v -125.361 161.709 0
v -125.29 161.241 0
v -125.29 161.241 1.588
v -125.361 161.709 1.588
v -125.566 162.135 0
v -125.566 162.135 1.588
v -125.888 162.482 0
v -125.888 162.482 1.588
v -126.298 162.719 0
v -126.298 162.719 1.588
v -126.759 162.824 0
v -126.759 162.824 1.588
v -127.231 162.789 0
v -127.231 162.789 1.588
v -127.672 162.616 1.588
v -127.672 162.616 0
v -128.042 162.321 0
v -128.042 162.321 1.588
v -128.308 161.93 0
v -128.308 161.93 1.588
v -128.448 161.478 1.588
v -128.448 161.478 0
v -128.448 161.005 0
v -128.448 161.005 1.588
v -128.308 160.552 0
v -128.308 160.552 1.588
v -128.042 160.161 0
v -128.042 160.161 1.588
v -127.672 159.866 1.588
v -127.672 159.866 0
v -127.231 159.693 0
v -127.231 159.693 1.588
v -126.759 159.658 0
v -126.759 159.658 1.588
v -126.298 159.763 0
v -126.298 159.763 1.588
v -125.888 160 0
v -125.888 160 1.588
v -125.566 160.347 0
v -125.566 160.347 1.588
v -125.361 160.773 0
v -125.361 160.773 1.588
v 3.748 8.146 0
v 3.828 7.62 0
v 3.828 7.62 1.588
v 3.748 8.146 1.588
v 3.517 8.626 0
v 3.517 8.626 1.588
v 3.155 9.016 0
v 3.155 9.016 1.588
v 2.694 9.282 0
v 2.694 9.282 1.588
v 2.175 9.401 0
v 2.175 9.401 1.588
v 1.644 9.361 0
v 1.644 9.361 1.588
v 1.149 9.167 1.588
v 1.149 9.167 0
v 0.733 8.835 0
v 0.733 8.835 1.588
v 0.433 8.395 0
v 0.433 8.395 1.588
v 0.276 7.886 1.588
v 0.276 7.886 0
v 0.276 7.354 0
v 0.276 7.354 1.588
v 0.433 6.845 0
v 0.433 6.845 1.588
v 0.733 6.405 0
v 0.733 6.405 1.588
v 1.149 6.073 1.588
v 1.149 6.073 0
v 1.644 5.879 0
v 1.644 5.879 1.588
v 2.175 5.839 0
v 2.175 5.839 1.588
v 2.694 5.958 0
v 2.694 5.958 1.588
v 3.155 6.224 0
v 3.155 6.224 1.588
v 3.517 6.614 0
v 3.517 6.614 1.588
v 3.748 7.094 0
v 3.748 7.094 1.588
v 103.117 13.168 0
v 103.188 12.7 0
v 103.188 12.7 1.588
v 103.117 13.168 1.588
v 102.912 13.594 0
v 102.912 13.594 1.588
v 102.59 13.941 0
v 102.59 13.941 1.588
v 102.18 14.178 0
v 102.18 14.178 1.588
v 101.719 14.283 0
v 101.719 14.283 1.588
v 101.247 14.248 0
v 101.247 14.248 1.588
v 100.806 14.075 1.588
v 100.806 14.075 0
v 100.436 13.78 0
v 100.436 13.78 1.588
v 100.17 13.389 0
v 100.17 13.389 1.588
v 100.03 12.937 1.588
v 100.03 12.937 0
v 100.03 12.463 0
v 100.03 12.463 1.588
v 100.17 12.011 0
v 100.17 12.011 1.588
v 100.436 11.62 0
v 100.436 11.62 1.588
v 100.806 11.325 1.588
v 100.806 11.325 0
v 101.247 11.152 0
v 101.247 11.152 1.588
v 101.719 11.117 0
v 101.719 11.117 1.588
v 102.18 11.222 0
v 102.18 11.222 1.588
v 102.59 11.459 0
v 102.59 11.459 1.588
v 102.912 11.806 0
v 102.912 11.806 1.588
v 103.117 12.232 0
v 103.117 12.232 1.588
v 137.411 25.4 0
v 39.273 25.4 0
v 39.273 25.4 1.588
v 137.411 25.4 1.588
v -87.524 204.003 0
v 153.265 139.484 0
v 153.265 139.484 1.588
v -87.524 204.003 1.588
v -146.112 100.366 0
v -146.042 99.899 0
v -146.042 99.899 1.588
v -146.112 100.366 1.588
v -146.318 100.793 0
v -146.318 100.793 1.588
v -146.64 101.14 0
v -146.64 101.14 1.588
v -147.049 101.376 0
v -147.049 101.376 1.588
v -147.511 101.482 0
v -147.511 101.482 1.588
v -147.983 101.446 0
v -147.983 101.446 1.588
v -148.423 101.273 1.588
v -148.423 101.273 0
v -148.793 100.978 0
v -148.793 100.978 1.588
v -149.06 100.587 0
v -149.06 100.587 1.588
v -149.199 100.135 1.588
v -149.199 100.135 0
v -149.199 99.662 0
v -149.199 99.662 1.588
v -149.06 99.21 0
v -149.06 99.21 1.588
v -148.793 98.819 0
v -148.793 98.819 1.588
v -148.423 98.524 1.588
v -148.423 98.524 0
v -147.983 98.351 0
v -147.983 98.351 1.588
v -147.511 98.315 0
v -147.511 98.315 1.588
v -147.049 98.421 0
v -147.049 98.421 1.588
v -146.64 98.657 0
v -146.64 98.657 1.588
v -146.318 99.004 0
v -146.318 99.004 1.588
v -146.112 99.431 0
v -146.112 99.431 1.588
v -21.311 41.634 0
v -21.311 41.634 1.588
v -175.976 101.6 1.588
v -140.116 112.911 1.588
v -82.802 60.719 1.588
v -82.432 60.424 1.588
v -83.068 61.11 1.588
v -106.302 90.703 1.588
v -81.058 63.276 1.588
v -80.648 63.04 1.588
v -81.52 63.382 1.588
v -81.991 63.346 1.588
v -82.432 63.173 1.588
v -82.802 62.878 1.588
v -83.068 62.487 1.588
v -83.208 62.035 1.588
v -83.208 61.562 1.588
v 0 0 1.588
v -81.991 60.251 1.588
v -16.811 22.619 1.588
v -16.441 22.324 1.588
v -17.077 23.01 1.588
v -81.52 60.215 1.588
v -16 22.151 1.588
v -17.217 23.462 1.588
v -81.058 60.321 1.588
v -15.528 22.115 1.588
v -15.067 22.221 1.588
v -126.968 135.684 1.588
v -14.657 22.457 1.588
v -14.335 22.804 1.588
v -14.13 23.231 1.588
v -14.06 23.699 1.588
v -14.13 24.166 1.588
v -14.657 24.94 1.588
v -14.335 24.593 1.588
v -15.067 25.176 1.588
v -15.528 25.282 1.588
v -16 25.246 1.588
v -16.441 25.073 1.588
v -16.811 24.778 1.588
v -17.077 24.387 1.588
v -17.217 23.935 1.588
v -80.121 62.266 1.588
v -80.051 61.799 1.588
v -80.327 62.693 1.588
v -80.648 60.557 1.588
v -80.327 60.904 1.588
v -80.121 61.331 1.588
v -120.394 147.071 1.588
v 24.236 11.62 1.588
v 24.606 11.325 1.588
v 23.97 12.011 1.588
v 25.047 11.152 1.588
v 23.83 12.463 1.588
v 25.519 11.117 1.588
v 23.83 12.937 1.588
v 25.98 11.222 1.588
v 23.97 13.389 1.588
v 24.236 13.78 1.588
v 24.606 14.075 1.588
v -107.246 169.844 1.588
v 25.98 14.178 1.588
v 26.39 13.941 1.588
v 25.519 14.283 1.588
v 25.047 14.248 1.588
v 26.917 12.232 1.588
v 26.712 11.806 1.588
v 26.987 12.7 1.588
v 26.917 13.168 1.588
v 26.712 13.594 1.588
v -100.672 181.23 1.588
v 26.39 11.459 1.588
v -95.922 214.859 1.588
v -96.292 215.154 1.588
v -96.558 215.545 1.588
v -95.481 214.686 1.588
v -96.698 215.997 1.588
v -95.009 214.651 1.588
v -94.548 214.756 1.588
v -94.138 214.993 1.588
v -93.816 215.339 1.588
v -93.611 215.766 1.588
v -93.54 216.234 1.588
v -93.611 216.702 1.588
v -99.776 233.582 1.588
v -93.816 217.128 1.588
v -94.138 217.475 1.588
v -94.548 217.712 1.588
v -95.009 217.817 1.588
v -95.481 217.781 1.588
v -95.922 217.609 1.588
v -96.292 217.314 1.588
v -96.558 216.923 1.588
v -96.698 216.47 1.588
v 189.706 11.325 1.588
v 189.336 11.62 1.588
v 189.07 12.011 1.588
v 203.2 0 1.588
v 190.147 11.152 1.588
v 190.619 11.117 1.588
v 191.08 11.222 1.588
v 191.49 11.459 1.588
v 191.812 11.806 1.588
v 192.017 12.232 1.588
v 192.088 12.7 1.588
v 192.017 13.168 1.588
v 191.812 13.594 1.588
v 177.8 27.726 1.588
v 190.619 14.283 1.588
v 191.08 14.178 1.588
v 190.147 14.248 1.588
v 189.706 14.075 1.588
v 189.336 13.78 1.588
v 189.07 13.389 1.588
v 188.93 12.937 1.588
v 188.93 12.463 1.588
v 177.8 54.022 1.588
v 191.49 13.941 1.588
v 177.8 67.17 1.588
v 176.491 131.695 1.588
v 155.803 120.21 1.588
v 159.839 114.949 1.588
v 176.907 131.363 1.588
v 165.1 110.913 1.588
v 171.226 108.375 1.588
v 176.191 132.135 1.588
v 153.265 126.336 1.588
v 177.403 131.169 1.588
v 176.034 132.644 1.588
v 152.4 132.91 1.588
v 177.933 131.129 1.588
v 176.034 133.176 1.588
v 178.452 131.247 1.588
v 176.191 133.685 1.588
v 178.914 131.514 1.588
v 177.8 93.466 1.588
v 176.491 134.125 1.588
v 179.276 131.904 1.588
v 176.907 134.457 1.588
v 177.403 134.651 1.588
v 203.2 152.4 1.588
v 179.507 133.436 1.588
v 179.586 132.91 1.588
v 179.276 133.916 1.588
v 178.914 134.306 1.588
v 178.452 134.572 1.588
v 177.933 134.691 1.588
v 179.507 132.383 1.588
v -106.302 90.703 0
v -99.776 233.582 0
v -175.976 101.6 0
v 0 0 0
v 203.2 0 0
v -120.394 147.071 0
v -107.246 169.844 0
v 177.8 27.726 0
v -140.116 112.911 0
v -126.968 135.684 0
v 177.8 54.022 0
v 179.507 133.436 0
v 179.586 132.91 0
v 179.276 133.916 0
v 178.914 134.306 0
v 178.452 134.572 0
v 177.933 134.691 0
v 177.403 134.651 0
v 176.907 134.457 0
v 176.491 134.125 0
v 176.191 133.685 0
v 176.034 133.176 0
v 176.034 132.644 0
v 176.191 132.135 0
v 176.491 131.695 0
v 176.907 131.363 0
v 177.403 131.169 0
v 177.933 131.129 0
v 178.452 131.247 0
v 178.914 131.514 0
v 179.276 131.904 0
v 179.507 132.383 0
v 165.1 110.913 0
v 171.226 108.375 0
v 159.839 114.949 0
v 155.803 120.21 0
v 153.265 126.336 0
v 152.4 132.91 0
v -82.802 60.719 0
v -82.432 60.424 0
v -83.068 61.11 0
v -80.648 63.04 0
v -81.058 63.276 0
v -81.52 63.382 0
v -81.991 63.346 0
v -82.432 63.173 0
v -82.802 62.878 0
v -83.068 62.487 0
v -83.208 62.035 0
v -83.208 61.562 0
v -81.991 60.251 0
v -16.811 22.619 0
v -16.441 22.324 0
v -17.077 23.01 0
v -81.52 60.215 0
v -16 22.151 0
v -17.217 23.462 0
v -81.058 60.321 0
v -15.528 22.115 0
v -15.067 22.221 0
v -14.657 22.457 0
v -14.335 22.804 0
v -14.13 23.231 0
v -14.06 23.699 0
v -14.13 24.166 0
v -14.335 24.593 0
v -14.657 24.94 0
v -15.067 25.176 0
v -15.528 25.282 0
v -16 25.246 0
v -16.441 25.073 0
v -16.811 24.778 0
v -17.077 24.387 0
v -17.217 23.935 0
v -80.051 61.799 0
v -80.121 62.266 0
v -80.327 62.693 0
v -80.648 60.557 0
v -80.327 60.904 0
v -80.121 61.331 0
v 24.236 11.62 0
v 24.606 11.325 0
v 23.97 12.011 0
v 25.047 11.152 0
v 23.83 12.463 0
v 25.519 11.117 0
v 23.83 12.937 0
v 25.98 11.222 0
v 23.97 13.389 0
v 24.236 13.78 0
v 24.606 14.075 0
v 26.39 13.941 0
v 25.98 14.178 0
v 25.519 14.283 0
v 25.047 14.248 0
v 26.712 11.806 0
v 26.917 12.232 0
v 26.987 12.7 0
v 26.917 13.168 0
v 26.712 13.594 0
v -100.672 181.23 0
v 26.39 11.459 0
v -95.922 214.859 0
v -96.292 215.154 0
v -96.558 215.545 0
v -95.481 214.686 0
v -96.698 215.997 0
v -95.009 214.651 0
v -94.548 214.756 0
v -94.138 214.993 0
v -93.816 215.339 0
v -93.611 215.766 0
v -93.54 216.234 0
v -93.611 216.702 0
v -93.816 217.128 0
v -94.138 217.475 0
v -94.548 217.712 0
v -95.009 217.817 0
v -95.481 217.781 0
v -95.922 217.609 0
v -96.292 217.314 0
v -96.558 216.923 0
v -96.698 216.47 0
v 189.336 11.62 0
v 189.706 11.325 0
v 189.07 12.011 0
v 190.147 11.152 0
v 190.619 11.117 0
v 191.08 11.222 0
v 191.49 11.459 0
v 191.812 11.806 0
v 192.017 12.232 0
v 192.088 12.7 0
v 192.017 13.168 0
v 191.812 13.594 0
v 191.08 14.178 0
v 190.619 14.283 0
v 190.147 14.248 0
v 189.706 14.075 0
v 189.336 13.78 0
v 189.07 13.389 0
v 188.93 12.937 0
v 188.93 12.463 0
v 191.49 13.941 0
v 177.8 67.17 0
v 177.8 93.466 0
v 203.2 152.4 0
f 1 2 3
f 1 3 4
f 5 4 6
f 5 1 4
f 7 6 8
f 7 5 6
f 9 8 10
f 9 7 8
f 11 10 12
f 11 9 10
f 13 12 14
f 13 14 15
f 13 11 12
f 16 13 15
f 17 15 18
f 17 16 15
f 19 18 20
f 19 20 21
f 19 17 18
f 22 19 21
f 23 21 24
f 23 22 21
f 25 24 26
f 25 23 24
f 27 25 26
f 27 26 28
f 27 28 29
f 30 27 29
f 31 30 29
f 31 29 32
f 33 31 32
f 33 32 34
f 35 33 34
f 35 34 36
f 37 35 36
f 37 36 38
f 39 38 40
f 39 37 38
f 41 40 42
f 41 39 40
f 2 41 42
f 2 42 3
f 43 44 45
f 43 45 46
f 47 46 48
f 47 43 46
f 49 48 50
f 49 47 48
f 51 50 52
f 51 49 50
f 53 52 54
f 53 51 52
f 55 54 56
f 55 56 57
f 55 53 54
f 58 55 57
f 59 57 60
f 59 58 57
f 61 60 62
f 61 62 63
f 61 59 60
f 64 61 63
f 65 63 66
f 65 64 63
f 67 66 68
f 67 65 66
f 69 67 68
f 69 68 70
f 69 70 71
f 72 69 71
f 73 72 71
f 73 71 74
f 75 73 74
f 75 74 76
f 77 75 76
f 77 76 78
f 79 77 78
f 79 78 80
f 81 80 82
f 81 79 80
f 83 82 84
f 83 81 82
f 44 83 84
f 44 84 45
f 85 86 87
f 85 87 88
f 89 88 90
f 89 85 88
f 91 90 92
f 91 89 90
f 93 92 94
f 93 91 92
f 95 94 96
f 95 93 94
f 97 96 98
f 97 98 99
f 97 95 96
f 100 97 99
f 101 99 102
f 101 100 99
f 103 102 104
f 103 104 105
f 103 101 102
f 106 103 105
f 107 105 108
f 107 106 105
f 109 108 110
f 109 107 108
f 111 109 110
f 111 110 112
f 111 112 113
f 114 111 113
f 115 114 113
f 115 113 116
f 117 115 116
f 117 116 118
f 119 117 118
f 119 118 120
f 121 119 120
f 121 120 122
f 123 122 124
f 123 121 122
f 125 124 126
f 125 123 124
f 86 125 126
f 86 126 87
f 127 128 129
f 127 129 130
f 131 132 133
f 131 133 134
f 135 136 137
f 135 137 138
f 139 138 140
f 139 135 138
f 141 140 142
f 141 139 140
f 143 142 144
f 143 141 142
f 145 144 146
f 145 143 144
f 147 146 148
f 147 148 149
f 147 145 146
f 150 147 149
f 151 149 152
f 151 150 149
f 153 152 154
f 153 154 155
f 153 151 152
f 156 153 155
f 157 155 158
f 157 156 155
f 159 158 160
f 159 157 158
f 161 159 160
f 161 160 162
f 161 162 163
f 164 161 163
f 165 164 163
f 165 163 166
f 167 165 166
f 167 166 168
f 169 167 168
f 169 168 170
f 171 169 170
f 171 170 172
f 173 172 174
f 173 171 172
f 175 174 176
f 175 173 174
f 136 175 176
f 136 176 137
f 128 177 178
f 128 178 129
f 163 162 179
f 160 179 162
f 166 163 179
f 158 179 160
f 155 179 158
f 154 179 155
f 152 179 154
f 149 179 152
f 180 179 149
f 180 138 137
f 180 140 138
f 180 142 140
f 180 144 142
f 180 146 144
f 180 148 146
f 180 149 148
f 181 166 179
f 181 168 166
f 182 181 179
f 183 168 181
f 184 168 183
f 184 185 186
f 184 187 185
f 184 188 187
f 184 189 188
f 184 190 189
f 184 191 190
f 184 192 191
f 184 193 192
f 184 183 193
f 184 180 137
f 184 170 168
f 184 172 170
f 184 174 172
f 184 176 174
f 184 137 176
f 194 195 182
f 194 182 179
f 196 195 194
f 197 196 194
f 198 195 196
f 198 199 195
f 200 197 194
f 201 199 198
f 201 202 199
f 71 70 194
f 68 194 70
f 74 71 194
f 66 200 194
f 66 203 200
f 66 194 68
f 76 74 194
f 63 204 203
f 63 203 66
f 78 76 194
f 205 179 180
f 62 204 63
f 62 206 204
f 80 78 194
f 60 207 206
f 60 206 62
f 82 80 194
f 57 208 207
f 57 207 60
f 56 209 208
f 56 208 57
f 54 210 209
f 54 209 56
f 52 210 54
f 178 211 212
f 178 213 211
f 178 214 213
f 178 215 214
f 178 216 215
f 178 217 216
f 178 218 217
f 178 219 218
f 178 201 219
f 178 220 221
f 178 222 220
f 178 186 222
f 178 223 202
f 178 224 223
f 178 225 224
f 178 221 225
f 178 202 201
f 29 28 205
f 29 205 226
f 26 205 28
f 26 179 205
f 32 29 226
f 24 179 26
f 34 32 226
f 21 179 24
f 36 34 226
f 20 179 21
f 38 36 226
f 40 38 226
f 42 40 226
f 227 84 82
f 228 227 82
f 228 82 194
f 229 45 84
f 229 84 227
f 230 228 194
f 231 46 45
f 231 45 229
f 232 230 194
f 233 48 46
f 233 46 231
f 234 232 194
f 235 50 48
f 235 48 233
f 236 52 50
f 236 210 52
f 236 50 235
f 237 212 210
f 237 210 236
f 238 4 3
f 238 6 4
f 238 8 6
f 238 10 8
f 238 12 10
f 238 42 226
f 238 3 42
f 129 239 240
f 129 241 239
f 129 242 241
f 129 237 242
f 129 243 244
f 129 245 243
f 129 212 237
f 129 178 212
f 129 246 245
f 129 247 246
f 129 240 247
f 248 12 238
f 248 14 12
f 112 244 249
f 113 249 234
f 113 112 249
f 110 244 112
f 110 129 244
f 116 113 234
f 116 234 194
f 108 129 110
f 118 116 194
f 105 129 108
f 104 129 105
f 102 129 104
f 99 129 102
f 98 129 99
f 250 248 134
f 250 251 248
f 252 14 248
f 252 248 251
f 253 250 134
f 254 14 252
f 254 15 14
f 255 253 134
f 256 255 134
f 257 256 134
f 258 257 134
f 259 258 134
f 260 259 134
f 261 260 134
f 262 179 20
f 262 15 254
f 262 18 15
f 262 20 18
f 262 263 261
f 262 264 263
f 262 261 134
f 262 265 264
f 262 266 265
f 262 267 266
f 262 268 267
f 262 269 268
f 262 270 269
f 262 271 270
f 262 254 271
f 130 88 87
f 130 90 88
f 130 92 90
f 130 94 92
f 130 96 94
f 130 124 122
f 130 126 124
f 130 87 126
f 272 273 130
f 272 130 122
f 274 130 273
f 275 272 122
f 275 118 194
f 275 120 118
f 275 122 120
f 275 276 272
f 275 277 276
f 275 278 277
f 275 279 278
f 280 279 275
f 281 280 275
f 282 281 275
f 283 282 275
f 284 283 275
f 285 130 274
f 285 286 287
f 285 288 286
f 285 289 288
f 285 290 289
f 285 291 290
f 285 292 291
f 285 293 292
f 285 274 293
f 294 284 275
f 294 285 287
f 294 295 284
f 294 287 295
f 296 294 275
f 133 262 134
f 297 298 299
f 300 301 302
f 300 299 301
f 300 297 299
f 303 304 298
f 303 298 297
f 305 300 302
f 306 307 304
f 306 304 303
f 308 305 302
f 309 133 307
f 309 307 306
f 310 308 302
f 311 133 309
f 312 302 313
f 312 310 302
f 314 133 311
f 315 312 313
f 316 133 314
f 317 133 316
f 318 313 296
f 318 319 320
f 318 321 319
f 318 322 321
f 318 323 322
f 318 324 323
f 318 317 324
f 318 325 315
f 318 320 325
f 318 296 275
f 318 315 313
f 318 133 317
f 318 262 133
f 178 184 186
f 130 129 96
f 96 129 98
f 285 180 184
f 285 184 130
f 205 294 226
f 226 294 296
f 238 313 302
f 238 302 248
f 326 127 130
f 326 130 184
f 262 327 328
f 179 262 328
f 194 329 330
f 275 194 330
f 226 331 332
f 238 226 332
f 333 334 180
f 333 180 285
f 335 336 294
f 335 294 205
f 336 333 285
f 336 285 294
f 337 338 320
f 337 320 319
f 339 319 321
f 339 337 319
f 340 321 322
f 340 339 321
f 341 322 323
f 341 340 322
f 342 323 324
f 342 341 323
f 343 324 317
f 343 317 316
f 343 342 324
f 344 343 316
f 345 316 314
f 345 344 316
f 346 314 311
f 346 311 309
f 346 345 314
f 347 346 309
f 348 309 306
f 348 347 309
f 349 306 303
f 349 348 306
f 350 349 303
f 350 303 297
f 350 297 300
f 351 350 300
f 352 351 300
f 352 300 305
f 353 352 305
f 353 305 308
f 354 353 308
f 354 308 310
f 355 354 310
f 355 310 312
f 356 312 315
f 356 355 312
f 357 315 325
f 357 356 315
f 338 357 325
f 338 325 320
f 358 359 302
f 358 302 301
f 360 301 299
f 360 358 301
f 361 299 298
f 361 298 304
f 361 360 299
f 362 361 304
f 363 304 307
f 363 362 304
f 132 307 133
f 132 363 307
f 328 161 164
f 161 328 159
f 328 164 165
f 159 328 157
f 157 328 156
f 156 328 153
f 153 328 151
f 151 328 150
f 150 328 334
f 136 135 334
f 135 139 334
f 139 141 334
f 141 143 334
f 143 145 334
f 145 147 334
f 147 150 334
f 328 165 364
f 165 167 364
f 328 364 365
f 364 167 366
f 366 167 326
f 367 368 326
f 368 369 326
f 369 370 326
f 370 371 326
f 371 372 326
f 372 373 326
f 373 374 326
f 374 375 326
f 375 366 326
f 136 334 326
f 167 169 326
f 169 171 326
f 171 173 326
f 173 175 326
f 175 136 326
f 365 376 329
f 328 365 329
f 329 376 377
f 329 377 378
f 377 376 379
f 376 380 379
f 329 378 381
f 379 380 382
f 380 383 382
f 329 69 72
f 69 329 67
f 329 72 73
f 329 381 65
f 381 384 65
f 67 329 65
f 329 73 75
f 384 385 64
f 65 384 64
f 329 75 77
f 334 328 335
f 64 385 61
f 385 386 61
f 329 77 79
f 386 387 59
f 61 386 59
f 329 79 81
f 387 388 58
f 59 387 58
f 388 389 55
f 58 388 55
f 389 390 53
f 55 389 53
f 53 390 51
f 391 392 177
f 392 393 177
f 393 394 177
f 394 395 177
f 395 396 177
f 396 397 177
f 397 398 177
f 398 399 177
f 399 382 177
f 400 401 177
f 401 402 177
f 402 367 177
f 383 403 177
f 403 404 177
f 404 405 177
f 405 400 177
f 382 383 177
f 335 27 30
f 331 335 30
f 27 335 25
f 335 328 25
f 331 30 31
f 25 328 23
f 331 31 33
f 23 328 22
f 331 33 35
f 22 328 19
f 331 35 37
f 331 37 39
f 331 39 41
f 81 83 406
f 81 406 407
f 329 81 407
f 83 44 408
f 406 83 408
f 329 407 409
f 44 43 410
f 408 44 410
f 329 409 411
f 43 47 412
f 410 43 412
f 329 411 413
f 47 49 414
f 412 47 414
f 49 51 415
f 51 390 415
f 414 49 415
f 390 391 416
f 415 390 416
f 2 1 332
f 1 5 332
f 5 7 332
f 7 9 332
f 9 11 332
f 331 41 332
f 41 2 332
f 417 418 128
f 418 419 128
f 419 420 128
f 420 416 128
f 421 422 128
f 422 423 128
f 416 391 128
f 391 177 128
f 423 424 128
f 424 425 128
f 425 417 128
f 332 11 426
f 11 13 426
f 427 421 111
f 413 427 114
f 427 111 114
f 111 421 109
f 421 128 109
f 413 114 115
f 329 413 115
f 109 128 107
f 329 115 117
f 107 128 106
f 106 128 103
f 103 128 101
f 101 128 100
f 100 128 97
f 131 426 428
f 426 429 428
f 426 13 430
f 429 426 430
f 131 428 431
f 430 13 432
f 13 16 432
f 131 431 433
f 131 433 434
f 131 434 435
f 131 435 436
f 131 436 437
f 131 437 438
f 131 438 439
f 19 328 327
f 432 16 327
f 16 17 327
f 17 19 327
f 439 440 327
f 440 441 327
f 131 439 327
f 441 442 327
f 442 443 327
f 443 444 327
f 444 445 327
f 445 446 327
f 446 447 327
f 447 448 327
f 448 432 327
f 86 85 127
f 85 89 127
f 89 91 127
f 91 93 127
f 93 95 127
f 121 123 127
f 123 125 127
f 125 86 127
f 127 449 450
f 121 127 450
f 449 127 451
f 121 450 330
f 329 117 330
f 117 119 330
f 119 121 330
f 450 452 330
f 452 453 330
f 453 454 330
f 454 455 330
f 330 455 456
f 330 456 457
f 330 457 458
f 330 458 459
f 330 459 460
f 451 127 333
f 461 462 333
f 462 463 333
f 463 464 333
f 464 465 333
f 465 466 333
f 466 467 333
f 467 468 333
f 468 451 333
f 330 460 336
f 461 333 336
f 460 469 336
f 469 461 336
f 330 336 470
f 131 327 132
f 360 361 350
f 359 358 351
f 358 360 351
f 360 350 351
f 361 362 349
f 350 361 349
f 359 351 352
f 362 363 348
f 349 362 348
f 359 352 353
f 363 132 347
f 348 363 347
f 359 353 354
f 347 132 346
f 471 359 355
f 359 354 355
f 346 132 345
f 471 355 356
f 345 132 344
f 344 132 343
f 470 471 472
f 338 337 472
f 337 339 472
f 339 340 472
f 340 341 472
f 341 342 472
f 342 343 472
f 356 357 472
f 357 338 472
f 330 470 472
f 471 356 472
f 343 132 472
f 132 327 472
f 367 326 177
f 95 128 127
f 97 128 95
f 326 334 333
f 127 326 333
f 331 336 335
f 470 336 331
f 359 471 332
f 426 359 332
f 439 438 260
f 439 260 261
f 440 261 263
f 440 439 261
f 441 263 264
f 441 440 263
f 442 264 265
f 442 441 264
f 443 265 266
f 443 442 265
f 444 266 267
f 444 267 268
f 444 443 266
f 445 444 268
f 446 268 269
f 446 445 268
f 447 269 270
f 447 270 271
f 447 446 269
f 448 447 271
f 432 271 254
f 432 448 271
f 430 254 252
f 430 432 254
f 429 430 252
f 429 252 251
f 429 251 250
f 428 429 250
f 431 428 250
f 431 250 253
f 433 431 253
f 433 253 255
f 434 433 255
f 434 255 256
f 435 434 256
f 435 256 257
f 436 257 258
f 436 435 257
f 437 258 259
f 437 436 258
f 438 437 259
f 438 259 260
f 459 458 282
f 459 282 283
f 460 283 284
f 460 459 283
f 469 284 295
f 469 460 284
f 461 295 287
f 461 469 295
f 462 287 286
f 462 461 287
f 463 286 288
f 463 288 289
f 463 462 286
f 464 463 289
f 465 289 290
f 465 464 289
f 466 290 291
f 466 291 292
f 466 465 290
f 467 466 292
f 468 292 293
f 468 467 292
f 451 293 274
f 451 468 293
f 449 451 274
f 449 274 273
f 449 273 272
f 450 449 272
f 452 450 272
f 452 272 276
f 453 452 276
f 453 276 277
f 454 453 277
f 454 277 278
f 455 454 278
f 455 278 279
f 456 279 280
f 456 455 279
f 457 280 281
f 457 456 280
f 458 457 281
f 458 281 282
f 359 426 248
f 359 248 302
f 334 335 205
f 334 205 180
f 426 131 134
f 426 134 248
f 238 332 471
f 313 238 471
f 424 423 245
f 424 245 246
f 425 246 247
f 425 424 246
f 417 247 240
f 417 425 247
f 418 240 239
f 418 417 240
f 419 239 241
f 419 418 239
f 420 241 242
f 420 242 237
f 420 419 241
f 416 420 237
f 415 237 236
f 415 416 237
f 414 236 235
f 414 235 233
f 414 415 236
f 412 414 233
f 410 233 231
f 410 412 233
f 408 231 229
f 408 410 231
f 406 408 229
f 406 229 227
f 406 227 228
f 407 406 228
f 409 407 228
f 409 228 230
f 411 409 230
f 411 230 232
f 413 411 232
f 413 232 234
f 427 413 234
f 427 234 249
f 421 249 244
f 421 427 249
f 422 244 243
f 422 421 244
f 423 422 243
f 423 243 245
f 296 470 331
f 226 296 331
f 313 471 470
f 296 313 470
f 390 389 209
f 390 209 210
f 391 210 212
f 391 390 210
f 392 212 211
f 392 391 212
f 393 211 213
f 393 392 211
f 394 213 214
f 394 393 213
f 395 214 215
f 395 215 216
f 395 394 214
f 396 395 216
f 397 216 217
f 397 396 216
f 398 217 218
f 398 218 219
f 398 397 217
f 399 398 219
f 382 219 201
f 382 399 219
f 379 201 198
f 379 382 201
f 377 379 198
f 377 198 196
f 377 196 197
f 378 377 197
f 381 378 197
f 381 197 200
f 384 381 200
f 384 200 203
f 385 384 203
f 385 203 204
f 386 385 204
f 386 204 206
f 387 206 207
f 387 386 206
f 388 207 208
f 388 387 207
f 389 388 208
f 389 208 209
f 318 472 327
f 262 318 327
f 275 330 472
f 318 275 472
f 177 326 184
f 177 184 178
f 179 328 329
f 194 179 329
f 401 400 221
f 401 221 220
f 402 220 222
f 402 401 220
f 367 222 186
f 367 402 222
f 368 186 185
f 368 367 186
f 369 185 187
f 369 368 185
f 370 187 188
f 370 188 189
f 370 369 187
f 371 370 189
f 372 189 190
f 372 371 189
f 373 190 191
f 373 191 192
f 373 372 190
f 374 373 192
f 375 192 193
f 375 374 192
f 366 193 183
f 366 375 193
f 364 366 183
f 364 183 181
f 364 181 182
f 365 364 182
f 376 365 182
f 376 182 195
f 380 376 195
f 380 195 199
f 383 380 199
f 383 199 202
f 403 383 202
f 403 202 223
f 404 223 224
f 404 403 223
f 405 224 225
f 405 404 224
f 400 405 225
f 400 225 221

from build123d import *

# Parameters (mm, degrees)
SKETCH_1_R      = 1.7859375
SKETCH_1_R_2    = 1.5875
EXTRUDE_1_DEPTH = 1.5875


with BuildPart() as part:
    # 스케치1 → 보스-돌출1 (new body)
    with BuildSketch(Plane.XY):
        Polygon((0, 0), (203.2, 0), (203.2, 152.4), (-99.776362049, 233.582271537), (-175.976362049, 101.6), align=None)
        with Locations((2.041772846, 7.62)):
            Circle(SKETCH_1_R, mode=Mode.SUBTRACT)
        with Locations((177.8, 132.909894505)):
            Circle(SKETCH_1_R, mode=Mode.SUBTRACT)
        with Locations((190.5, 12.7)):
            Circle(SKETCH_1_R_2, mode=Mode.SUBTRACT)
        with Locations((101.6, 12.7)):
            Circle(SKETCH_1_R_2, mode=Mode.SUBTRACT)
        with Locations((25.4, 12.7)):
            Circle(SKETCH_1_R_2, mode=Mode.SUBTRACT)
        with Locations((-147.629316793, 99.898522628)):
            Circle(SKETCH_1_R_2, mode=Mode.SUBTRACT)
        with Locations((-81.638181024, 61.798522628)):
            Circle(SKETCH_1_R_2, mode=Mode.SUBTRACT)
        with Locations((-15.647045256, 23.698522628)):
            Circle(SKETCH_1_R_2, mode=Mode.SUBTRACT)
        with Locations((-95.127839421, 216.233748909)):
            Circle(SKETCH_1_R_2, mode=Mode.SUBTRACT)
        with Locations((-126.877839421, 161.241135768)):
            Circle(SKETCH_1_R_2, mode=Mode.SUBTRACT)
        Polygon((-106.301504082, 90.702595672), (-21.311447622, 41.633563696), (39.27303688, 25.4), (137.411100831, 25.4), align=None, mode=Mode.SUBTRACT)
        Polygon((177.8, 27.725834576), (177.8, 54.021849558), (-126.968392014, 135.684294077), (-140.116399505, 112.911277084), align=None, mode=Mode.SUBTRACT)
        with BuildLine():
            Line((-100.672377031, 181.230328063), (171.225996254, 108.375378518))
            ThreePointArc((171.225996254, 108.375378518), (155.802954744, 120.209894505), (153.265484012, 139.483898251))
            Line((153.265484012, 139.483898251), (-87.52436954, 204.003345056))
            Line((-87.52436954, 204.003345056), (-100.672377031, 181.230328063))
        make_face(mode=Mode.SUBTRACT)
        Polygon((-107.246380777, 169.843819566), (177.8, 93.465872032), (177.8, 67.169857049), (-120.394388268, 147.070802573), align=None, mode=Mode.SUBTRACT)
    extrude(amount=EXTRUDE_1_DEPTH)


solid = part.part
